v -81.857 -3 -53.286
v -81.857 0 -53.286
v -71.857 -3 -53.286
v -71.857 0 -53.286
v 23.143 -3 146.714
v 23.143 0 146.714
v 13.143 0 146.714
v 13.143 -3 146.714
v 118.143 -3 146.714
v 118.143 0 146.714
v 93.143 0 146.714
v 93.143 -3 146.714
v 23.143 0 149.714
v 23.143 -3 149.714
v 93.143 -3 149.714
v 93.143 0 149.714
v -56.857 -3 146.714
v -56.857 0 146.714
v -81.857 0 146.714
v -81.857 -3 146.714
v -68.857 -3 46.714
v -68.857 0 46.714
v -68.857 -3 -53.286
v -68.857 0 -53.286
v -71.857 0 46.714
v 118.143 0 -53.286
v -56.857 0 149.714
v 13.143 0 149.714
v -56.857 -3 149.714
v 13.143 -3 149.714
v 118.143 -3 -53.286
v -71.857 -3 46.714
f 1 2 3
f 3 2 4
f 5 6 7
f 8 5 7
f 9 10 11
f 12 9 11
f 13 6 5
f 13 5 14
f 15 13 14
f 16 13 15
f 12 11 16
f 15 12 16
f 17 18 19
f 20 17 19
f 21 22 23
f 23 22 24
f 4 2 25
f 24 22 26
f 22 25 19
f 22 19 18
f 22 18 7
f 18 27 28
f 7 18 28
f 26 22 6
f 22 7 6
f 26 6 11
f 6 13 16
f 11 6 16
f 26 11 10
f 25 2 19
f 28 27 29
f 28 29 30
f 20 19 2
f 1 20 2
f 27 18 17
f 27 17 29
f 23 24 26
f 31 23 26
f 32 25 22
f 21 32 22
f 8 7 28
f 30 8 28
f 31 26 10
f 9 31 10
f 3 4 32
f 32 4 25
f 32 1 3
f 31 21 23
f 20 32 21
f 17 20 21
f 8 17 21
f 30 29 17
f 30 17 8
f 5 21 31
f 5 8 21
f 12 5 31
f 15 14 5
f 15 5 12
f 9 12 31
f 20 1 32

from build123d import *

# Parameters (mm, degrees)
F0_W     = 70
F0_H     = 3
F1_DEPTH = 3


with BuildPart() as f1:
    # F0 (on Front) → F1 (new body)
    with BuildSketch(Plane.XZ):
        Polygon((-56.857143, 146.714286), (-81.857143, 146.714286), (-81.857143, -53.285714), (-71.857143, -53.285714), (-71.857143, 46.714286), (-68.857143, 46.714286), (-68.857143, -53.285714), (118.142857, -53.285714), (118.142857, -43.285714), (118.142857, -40.285714), (118.142857, 146.714286), (93.142857, 146.714286), (23.142857, 146.714286), (13.142857, 146.714286), align=None)
        with Locations((-21.857143, 148.214286)):
            Rectangle(F0_W, F0_H)
        with Locations((58.142857, 148.214286)):
            Rectangle(F0_W, F0_H)
    extrude(amount=F1_DEPTH)


solid = f1.part
